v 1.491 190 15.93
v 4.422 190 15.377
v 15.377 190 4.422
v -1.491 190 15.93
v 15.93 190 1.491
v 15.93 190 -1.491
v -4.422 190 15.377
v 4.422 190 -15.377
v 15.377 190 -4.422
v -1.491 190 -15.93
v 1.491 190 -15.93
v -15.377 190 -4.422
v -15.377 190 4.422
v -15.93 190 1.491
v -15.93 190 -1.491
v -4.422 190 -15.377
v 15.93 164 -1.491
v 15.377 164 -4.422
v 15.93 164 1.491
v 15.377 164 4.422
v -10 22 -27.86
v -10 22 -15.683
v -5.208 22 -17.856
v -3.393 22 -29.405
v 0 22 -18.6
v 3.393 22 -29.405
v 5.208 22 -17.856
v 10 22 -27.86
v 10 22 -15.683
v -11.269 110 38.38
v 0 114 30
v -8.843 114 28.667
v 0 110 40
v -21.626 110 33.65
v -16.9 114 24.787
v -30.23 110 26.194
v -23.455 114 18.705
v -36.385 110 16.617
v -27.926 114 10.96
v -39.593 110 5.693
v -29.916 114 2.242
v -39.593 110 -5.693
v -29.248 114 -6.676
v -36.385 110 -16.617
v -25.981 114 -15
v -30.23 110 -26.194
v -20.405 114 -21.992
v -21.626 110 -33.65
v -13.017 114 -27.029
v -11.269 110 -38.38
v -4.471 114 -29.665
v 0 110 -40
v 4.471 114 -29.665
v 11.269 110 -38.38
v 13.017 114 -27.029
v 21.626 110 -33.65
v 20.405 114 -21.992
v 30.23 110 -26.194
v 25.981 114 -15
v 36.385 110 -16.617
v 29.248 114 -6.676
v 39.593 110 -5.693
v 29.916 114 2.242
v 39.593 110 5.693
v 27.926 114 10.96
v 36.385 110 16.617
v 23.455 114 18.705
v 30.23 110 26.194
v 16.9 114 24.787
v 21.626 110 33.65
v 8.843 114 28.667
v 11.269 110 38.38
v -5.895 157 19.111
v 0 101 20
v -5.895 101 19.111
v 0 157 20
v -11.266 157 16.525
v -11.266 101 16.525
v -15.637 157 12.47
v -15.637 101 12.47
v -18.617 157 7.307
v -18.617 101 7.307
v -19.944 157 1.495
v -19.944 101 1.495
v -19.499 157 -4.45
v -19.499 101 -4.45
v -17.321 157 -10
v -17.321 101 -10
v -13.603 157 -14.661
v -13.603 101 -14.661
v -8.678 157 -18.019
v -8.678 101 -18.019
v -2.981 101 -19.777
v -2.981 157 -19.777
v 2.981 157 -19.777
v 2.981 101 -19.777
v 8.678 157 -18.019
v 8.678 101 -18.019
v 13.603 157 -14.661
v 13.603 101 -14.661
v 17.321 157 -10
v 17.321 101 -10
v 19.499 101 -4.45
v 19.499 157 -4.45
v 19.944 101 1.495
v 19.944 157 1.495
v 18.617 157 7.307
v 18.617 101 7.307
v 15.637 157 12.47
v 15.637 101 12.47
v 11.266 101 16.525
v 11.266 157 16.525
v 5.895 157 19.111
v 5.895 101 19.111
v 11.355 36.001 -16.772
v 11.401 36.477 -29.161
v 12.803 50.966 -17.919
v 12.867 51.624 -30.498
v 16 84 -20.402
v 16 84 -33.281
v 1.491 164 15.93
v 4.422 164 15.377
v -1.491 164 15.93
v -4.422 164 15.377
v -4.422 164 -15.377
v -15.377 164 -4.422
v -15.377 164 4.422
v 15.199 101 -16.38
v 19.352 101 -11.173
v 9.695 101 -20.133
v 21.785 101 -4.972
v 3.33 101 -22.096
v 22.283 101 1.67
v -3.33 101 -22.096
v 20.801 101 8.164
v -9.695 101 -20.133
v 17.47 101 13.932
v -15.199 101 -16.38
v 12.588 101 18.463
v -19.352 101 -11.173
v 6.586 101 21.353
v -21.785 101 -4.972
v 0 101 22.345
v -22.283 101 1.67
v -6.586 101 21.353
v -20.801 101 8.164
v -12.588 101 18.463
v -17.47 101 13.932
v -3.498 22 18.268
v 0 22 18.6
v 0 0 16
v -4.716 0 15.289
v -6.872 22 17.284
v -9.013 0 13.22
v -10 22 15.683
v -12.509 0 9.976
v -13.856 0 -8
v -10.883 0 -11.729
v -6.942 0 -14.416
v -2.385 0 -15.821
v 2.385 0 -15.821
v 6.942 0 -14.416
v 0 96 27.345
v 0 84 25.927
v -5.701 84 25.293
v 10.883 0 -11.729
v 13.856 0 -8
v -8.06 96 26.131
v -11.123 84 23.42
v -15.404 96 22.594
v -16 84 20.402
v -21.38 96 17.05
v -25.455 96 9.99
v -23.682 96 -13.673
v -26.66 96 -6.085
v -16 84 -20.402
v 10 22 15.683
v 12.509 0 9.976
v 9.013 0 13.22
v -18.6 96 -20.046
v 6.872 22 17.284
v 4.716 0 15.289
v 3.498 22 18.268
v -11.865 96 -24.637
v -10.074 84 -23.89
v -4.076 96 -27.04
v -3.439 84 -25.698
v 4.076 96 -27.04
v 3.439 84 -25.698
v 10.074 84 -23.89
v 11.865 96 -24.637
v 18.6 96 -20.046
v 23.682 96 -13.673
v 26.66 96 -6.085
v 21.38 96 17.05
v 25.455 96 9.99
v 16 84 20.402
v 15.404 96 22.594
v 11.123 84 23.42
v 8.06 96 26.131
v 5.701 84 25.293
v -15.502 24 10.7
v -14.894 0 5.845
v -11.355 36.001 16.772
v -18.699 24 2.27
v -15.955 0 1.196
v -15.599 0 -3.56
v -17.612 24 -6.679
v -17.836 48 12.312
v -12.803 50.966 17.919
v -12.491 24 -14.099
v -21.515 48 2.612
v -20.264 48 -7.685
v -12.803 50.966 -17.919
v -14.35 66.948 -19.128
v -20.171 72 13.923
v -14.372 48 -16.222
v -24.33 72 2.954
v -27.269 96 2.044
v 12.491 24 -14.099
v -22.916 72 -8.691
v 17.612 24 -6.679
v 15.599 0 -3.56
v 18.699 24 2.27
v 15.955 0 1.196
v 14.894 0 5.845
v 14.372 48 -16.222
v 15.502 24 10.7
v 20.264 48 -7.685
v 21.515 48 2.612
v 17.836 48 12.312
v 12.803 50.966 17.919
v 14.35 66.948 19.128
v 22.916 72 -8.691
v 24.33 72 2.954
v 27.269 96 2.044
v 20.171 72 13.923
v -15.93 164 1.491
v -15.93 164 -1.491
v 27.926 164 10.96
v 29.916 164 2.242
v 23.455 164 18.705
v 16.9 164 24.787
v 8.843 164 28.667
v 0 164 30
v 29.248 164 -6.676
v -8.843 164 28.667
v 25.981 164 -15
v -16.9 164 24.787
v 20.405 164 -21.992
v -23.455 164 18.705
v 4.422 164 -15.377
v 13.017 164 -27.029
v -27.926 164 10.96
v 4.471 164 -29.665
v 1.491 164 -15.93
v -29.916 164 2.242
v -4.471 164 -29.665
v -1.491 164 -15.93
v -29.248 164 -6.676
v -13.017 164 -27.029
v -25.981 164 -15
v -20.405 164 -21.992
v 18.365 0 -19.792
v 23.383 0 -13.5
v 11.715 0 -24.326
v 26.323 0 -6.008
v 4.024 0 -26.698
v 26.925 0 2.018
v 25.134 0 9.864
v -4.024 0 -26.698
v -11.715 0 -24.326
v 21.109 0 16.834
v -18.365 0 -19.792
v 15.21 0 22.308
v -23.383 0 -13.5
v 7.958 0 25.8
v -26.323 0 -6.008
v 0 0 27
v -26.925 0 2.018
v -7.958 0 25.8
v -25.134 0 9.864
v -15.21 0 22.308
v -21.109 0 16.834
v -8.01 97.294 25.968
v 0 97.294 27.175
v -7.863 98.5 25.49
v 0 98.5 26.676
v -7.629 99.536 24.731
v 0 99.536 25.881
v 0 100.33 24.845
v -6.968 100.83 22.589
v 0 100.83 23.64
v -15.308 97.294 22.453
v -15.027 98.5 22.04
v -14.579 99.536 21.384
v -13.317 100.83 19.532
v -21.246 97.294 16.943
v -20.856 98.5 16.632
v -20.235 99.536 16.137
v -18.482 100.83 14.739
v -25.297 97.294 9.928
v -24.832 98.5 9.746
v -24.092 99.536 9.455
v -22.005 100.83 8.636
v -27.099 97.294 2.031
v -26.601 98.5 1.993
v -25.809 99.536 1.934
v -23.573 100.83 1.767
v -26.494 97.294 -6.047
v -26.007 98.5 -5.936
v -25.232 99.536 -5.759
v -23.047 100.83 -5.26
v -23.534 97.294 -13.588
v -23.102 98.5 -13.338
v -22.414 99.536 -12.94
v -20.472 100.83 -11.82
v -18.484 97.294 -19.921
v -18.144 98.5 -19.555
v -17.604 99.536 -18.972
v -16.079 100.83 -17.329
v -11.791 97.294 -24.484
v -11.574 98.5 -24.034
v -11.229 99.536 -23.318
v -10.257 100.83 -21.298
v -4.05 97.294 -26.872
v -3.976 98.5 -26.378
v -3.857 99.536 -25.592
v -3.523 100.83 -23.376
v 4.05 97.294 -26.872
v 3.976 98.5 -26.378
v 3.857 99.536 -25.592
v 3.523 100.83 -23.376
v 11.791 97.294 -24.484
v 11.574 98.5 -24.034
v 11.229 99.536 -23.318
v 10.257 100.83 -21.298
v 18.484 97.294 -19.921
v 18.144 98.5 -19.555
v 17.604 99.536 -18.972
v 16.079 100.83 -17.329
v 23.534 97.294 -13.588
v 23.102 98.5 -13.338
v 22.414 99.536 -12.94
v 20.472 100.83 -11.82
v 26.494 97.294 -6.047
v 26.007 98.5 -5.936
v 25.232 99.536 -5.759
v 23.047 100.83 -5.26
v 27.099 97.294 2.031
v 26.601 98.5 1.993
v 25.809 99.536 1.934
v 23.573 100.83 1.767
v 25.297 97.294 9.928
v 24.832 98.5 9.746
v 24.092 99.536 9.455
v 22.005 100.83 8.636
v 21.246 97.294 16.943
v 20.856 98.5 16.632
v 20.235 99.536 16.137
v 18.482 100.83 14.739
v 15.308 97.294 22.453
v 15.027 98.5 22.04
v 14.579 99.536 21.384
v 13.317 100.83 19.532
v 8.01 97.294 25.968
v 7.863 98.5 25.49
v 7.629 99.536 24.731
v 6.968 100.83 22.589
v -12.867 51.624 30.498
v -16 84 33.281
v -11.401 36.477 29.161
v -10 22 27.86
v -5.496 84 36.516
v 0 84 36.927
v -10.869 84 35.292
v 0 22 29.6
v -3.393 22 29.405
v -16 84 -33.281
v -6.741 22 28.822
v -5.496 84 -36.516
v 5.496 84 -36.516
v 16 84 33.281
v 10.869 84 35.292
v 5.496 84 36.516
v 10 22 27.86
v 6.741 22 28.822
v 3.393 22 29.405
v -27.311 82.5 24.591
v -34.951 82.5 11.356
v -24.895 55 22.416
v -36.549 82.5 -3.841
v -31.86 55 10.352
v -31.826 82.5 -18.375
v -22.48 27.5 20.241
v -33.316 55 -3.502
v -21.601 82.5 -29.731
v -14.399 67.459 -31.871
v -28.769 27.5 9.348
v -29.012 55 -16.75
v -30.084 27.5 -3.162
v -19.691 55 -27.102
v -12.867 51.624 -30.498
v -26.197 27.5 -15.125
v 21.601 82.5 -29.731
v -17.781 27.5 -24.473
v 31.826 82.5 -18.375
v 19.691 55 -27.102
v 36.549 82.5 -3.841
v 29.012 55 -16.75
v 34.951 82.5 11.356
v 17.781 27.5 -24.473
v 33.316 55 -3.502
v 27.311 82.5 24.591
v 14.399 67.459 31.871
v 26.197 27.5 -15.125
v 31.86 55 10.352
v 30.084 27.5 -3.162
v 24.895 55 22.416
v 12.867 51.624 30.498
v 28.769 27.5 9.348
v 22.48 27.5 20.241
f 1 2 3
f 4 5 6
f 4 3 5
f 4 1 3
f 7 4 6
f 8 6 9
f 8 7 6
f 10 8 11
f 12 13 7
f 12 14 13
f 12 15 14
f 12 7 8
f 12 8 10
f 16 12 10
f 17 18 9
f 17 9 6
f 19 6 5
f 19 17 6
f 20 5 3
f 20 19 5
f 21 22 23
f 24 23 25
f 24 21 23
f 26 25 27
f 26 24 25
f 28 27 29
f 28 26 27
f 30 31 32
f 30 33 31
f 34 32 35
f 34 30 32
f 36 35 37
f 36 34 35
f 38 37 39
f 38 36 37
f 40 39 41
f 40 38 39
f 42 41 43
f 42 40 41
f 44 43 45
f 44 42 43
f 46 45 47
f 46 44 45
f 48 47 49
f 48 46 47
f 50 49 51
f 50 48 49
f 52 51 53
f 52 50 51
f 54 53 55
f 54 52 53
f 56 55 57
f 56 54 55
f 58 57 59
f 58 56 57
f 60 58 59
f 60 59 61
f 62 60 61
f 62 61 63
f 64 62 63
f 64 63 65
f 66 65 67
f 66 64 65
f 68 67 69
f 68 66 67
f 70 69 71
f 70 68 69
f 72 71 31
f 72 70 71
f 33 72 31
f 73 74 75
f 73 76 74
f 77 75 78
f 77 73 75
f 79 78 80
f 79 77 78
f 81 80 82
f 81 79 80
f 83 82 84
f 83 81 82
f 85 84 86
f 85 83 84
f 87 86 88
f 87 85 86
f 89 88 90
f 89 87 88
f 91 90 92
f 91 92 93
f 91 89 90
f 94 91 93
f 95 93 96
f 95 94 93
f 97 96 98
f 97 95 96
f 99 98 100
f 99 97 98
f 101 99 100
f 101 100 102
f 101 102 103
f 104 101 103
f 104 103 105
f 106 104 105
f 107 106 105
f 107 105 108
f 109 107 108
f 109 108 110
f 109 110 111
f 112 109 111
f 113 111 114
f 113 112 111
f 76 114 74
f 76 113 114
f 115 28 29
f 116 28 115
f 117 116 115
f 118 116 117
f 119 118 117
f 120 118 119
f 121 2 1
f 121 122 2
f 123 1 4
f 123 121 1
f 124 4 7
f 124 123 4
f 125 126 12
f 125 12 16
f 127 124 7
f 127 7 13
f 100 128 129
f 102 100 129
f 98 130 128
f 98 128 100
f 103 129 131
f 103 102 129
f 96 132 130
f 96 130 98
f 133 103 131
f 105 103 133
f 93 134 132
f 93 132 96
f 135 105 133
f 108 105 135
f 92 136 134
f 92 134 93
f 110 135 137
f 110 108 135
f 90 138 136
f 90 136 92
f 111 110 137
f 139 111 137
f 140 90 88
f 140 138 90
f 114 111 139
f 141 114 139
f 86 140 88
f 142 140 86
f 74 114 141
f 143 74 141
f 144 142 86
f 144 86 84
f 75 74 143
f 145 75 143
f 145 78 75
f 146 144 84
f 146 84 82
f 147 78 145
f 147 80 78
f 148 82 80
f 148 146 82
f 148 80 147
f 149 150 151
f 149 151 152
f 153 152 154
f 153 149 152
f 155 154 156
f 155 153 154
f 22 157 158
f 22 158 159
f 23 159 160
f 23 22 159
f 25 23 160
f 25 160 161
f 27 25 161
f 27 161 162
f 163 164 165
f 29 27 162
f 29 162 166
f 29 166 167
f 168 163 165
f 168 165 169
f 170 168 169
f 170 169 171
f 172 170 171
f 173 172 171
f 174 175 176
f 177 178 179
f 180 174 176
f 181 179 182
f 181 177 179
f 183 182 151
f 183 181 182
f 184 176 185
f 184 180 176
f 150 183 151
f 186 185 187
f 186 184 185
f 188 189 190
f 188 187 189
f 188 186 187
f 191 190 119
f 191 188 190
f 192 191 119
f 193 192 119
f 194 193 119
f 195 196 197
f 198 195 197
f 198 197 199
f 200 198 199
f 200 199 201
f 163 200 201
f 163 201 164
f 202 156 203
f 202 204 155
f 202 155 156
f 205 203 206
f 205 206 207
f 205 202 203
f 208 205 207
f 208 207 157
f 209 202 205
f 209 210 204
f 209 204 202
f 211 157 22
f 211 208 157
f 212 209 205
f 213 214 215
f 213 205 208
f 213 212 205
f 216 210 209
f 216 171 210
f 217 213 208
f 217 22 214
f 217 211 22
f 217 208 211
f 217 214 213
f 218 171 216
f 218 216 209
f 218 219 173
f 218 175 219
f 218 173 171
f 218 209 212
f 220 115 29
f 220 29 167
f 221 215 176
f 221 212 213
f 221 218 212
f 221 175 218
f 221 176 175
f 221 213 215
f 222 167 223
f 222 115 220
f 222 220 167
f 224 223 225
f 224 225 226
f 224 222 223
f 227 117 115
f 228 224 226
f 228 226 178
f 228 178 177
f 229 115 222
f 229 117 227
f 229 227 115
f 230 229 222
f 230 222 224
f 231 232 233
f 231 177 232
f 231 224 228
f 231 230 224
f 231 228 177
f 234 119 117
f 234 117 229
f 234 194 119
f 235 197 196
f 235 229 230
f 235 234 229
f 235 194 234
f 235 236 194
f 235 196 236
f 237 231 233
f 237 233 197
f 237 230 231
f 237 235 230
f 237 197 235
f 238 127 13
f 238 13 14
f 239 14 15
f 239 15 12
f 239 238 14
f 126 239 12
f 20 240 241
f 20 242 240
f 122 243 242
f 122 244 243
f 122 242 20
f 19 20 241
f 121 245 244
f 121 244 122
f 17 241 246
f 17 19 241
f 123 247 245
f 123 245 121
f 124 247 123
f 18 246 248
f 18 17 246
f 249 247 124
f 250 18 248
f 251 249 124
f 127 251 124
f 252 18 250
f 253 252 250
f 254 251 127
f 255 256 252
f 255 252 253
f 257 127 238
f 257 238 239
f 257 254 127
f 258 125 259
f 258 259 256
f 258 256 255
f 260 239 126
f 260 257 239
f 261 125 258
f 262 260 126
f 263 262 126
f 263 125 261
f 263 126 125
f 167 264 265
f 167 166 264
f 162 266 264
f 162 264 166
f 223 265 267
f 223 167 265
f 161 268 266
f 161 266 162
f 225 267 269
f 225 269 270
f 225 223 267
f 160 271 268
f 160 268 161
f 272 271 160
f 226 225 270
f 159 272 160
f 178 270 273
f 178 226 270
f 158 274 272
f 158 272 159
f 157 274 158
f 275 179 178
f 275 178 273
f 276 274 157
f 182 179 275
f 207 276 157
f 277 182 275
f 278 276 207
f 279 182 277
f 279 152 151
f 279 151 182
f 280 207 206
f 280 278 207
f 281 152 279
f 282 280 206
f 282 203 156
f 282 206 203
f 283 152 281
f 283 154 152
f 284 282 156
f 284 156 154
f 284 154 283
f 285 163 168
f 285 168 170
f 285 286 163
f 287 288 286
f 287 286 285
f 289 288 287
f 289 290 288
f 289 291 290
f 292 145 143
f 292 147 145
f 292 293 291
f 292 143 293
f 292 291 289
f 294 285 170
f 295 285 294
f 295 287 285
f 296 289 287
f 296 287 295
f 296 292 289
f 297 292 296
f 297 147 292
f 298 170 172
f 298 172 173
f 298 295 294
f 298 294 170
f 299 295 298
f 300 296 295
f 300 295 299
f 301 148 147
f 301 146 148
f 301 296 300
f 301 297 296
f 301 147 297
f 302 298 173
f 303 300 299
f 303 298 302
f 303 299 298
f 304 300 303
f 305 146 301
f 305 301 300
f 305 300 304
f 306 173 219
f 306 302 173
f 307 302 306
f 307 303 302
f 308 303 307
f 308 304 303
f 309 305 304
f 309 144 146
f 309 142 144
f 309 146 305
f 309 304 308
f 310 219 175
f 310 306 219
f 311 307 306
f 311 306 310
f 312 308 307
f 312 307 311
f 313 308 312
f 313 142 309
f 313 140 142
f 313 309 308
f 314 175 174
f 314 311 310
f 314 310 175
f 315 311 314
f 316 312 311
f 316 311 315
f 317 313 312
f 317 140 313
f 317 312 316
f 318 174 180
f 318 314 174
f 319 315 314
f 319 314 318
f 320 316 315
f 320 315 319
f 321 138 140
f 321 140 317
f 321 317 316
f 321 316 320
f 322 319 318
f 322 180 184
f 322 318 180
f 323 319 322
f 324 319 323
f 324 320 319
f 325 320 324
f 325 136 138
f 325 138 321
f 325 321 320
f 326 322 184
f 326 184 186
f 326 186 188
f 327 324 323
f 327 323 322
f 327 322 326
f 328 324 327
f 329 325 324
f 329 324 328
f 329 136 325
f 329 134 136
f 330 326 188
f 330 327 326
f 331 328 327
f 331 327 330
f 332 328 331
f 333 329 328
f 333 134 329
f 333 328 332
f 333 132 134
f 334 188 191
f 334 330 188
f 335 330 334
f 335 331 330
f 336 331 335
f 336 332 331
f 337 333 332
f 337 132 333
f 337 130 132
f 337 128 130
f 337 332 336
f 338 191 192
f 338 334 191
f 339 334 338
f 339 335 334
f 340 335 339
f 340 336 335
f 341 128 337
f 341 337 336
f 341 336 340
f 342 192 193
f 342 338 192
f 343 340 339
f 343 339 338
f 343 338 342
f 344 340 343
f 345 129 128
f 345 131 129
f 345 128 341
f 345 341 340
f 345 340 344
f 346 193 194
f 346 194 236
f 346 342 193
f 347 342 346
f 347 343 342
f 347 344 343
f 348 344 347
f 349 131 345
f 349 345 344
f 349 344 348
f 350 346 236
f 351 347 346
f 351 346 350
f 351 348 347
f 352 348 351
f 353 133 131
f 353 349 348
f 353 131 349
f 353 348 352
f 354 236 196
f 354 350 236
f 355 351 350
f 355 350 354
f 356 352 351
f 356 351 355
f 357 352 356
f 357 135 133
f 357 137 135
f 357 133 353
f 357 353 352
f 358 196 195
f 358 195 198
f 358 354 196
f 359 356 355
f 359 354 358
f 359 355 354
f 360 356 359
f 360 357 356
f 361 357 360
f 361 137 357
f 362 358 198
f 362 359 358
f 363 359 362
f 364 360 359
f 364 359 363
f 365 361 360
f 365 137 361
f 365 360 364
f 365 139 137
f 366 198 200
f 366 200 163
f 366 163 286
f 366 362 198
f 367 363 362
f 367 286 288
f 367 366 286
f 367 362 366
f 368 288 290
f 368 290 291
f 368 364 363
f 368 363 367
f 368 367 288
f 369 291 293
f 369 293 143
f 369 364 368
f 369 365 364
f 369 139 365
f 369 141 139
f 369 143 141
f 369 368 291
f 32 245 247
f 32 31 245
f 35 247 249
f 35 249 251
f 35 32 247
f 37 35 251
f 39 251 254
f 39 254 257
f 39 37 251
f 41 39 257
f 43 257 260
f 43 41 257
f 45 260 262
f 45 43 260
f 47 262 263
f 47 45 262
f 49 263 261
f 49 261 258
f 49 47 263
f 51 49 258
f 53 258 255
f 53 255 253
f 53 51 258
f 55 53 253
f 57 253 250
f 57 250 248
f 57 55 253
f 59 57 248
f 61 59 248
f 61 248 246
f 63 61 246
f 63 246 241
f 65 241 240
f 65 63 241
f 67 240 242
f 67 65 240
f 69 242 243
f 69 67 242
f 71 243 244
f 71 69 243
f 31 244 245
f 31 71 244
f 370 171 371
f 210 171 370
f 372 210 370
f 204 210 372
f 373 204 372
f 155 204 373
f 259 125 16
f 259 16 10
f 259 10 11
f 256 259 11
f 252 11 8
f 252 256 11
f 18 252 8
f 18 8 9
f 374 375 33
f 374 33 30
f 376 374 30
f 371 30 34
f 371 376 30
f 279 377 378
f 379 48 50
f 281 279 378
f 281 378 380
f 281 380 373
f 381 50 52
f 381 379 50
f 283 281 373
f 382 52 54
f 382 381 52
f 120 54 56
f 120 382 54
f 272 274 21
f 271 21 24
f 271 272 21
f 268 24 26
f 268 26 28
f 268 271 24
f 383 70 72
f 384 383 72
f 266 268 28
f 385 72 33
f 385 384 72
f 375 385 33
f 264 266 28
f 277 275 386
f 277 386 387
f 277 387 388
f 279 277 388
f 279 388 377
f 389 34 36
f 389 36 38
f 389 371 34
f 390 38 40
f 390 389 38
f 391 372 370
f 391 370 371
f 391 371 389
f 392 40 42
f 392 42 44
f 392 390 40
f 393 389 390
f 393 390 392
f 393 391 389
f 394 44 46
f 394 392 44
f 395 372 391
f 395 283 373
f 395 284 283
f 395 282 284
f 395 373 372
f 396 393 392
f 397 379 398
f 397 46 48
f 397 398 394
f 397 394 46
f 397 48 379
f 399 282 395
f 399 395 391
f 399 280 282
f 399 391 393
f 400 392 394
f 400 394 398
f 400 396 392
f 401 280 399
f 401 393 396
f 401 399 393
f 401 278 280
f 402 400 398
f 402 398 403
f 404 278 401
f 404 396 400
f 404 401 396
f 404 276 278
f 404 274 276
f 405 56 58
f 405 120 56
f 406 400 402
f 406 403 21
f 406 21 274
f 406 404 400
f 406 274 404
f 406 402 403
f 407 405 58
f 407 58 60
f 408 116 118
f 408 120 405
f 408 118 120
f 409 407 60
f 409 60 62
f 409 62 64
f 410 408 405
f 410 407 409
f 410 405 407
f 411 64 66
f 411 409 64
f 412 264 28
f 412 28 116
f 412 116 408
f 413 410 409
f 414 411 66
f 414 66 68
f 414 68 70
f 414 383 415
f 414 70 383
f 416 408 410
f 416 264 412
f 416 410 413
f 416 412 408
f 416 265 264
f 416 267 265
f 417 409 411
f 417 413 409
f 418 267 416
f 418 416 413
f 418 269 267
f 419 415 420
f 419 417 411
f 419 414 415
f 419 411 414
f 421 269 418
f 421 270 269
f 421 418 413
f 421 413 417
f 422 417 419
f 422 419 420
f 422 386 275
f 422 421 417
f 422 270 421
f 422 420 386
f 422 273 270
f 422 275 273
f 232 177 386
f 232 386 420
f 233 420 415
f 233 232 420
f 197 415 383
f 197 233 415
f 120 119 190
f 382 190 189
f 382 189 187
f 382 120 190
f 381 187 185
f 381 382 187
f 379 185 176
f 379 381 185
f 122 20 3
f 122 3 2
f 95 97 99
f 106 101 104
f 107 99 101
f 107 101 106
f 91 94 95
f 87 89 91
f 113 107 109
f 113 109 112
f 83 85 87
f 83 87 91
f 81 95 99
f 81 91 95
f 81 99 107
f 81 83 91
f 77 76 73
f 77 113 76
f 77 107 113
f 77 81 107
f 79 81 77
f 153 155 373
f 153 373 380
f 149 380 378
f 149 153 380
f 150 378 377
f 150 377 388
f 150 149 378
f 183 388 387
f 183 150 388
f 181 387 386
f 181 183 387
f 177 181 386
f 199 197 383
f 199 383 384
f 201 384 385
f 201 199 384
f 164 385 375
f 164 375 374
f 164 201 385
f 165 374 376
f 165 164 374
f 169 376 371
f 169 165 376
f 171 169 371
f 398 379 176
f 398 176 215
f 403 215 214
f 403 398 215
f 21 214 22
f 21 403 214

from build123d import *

# Parameters (mm, degrees)
CUT_EXTRUDE1_DEPTH      = 199.242276016
CUT_EXTRUDE1_DEPTH_BACK = 199.242276016
SKETCH4_OUTSIDE_W       = 126.226
SKETCH4_OUTSIDE_H       = 126.226
CUT_EXTRUDE2_DEPTH      = 26


with BuildPart() as part:
    # Sketch1 → Revolve1 (revolve)
    with BuildSketch(Plane.XY, mode=Mode.PRIVATE) as revolve1_sk:
        with BuildLine():
            ThreePointArc((27.345454545, 96), (25.880988451, 99.535533906), (22.345454545, 101))
            Line((22.345454545, 101), (20, 101))
            Line((20, 101), (20, 157))
            Line((20, 157), (0, 157))
            Line((0, 157), (0, 190))
            Line((0, 190), (16, 190))
            Line((16, 190), (16, 164))
            Line((16, 164), (30, 164))
            Line((30, 164), (30, 114))
            Line((30, 114), (40, 110))
            Line((40, 110), (27, 0))
            Line((27, 0), (16, 0))
            Line((16, 0), (27.345454545, 96))
        make_face()
    revolve(revolve1_sk.sketch.rotate(Axis((0, 293.194202694, 0), (0, -1, 0)), 90), axis=Axis((0, 293.194202694, 0), (0, -1, 0)))

    # Sketch3 → Cut-Extrude1 (cut, two sides: drawn at the far end of the back side and taken through both)
    with BuildSketch(Plane.XY.offset(-CUT_EXTRUDE1_DEPTH_BACK)):
        Polygon((16, 84), (-16, 84), (-10, 22), (10, 22), align=None)
    extrude(amount=CUT_EXTRUDE1_DEPTH + CUT_EXTRUDE1_DEPTH_BACK, mode=Mode.SUBTRACT)

    # Sketch4 outside → Cut-Extrude2 (cut)
    with BuildSketch(Plane(origin=(0, 190, 0), x_dir=(1, 0, 0), z_dir=(0, 1, 0))):
        Rectangle(SKETCH4_OUTSIDE_W, SKETCH4_OUTSIDE_H)
        Polygon((3.798989873, 16), (16, 3.798989873), (16, -3.798989873), (3.798989873, -16), (-3.798989873, -16), (-16, -3.798989873), (-16, 3.798989873), (-3.798989873, 16), align=None, mode=Mode.SUBTRACT)
    extrude(amount=-CUT_EXTRUDE2_DEPTH, mode=Mode.SUBTRACT)


solid = part.part
